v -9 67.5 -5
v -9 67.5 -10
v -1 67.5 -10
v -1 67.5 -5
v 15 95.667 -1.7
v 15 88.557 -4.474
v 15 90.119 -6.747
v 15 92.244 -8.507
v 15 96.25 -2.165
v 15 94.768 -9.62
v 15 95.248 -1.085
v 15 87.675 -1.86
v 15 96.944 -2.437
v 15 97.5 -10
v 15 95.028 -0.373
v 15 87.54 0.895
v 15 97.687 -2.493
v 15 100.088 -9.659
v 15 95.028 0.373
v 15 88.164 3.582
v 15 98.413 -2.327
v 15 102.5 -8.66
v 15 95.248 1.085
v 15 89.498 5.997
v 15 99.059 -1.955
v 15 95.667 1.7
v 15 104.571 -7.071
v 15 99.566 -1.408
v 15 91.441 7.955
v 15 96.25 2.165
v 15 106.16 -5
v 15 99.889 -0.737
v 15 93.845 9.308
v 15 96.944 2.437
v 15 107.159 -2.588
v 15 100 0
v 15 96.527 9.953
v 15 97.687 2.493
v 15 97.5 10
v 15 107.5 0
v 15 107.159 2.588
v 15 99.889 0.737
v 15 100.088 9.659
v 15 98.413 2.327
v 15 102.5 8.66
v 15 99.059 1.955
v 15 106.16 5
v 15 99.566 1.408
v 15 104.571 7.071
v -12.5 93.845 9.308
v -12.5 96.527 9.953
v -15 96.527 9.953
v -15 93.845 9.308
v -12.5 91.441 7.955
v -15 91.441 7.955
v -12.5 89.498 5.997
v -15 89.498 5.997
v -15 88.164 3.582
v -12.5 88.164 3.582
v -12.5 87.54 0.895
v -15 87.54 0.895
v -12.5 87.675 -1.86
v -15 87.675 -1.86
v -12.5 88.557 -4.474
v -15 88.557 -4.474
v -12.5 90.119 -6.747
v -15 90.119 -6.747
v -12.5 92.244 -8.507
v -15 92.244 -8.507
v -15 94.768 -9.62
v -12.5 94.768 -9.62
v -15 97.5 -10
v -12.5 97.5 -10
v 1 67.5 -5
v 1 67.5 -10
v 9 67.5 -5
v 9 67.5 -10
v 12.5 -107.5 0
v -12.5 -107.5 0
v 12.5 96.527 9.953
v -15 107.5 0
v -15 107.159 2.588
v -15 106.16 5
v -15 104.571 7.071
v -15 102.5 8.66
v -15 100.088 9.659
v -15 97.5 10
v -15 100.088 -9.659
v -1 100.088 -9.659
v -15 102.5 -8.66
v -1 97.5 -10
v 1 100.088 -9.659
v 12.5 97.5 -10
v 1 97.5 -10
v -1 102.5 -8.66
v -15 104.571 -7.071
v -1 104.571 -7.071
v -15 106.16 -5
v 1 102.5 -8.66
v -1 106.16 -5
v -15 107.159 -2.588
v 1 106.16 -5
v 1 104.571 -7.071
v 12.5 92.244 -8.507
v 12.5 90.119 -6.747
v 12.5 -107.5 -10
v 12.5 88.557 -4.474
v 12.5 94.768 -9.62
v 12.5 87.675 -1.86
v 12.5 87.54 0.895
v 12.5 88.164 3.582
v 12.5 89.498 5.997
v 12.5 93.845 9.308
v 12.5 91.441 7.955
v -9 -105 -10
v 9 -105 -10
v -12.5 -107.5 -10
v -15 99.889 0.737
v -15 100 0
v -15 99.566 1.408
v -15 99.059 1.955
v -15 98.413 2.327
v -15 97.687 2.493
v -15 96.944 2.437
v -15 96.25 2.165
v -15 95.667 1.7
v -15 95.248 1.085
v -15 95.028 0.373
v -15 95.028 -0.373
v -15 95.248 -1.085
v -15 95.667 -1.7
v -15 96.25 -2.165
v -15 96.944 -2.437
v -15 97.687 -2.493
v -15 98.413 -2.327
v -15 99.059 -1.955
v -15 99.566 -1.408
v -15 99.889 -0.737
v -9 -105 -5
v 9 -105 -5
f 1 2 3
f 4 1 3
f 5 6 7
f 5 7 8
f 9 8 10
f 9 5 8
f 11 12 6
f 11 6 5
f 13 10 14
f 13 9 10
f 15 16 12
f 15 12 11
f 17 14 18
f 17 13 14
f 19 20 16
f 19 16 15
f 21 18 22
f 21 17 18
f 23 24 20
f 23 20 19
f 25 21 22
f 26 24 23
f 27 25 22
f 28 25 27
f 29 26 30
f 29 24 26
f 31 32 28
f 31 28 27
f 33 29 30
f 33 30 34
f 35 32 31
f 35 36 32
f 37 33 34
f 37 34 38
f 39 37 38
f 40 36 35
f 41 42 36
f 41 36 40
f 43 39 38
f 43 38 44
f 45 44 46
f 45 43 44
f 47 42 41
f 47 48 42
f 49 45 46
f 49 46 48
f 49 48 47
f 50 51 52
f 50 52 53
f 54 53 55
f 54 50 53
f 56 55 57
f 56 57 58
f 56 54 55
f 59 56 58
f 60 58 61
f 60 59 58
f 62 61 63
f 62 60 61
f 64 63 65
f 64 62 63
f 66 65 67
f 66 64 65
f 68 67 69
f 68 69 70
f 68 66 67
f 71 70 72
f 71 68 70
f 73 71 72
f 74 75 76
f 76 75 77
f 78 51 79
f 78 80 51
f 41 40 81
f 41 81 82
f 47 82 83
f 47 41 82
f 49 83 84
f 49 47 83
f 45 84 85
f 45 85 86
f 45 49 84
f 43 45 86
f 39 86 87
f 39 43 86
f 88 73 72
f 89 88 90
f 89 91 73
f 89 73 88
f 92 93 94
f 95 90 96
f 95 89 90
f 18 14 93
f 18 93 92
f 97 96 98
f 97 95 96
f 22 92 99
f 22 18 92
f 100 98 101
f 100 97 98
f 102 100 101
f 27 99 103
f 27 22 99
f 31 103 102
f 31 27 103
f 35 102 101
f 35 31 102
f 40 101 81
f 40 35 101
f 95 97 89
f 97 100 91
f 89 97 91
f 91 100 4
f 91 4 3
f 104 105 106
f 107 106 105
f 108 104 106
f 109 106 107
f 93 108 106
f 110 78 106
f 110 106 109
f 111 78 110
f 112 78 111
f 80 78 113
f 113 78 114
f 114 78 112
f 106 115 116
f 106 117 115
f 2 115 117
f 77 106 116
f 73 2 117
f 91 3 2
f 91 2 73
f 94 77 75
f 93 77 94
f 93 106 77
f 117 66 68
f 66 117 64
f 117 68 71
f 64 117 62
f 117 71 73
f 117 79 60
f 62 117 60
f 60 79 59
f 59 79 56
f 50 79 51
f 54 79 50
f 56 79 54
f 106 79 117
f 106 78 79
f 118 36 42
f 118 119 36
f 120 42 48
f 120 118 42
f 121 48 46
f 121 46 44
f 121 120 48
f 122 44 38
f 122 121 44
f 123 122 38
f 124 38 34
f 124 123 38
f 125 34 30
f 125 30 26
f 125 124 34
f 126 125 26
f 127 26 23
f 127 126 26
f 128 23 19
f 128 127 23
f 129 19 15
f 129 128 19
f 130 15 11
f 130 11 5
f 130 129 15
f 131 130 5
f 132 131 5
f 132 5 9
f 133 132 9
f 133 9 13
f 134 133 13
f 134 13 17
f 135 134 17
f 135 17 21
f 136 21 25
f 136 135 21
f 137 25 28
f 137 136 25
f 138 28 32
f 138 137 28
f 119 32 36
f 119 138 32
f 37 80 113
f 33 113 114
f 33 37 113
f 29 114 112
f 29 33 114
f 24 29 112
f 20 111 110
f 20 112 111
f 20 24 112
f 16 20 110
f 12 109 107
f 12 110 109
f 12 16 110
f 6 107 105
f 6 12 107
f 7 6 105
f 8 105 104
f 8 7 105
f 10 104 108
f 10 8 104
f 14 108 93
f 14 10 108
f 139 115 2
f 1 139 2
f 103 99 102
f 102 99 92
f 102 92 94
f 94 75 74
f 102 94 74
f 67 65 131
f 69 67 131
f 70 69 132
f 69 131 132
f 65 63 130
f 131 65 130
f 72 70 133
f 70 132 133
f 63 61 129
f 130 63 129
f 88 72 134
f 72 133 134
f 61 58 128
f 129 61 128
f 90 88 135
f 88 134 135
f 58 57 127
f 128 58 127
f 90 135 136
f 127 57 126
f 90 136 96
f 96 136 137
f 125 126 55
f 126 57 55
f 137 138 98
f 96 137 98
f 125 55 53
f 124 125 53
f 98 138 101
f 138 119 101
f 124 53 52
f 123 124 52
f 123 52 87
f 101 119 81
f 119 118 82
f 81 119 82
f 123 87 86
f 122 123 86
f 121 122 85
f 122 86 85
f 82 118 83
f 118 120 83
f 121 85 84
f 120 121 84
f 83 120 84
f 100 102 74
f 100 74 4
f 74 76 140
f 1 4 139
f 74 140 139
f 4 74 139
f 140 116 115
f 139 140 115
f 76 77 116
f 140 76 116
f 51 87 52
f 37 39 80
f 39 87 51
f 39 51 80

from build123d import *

# Parameters (mm, degrees)
F0_R          = 2.5
F1_DEPTH      = 15
F1_DEPTH_BACK = 15
F2_DEPTH      = 12.5
F2_DEPTH_BACK = 12.5
F4_DEPTH      = 5
F6_DEPTH      = 40.001


with BuildPart() as f1:
    # F0 (on Right) → F1 (new body, two sides)
    with BuildSketch(Plane.YZ) as f1_sk:
        with BuildLine():
            ThreePointArc((97.5, -10), (104.571068, -7.071068), (107.5, 0))
            ThreePointArc((107.5, 0), (104.571068, 7.071068), (97.5, 10))
            Line((97.5, 10), (96.526706, 9.952522))
            ThreePointArc((96.526706, 9.952522), (87.511876, -0.487226), (97.5, -10))
        make_face()
        with Locations((97.5, 0)):
            Circle(F0_R, mode=Mode.SUBTRACT)
    extrude(amount=F1_DEPTH)
    extrude(f1_sk.sketch, amount=-F1_DEPTH_BACK)

    # F0 (on Right) → F2 (join, two sides)
    with BuildSketch(Plane.YZ) as f2_sk:
        with BuildLine():
            Line((-107.5, -10), (97.5, -10))
            ThreePointArc((97.5, -10), (87.511876, -0.487226), (96.526706, 9.952522))
            Line((96.526706, 9.952522), (-107.5, 0))
            Line((-107.5, 0), (-107.5, -10))
        make_face()
    extrude(amount=F2_DEPTH)
    extrude(f2_sk.sketch, amount=-F2_DEPTH_BACK)

    # F3 (on face) → F4 (cut)
    with BuildSketch(Plane(origin=(0, 0, -10), x_dir=(1, 0, 0), z_dir=(0, 0, -1))):
        Polygon((9, -67.5), (9, 105), (-9, 105), (-9, -67.5), (0, -67.5), align=None)
    extrude(amount=-F4_DEPTH, mode=Mode.SUBTRACT)

    # F5 (on face) → F6 (cut, through all)
    with BuildSketch(Plane.XZ.offset(-67.5)):
        Polygon((-1, -10), (0, -10), (1, -10), (1, -5), (0, -5), (-1, -5), align=None)
    extrude(amount=-F6_DEPTH, mode=Mode.SUBTRACT)


solid = f1.part
